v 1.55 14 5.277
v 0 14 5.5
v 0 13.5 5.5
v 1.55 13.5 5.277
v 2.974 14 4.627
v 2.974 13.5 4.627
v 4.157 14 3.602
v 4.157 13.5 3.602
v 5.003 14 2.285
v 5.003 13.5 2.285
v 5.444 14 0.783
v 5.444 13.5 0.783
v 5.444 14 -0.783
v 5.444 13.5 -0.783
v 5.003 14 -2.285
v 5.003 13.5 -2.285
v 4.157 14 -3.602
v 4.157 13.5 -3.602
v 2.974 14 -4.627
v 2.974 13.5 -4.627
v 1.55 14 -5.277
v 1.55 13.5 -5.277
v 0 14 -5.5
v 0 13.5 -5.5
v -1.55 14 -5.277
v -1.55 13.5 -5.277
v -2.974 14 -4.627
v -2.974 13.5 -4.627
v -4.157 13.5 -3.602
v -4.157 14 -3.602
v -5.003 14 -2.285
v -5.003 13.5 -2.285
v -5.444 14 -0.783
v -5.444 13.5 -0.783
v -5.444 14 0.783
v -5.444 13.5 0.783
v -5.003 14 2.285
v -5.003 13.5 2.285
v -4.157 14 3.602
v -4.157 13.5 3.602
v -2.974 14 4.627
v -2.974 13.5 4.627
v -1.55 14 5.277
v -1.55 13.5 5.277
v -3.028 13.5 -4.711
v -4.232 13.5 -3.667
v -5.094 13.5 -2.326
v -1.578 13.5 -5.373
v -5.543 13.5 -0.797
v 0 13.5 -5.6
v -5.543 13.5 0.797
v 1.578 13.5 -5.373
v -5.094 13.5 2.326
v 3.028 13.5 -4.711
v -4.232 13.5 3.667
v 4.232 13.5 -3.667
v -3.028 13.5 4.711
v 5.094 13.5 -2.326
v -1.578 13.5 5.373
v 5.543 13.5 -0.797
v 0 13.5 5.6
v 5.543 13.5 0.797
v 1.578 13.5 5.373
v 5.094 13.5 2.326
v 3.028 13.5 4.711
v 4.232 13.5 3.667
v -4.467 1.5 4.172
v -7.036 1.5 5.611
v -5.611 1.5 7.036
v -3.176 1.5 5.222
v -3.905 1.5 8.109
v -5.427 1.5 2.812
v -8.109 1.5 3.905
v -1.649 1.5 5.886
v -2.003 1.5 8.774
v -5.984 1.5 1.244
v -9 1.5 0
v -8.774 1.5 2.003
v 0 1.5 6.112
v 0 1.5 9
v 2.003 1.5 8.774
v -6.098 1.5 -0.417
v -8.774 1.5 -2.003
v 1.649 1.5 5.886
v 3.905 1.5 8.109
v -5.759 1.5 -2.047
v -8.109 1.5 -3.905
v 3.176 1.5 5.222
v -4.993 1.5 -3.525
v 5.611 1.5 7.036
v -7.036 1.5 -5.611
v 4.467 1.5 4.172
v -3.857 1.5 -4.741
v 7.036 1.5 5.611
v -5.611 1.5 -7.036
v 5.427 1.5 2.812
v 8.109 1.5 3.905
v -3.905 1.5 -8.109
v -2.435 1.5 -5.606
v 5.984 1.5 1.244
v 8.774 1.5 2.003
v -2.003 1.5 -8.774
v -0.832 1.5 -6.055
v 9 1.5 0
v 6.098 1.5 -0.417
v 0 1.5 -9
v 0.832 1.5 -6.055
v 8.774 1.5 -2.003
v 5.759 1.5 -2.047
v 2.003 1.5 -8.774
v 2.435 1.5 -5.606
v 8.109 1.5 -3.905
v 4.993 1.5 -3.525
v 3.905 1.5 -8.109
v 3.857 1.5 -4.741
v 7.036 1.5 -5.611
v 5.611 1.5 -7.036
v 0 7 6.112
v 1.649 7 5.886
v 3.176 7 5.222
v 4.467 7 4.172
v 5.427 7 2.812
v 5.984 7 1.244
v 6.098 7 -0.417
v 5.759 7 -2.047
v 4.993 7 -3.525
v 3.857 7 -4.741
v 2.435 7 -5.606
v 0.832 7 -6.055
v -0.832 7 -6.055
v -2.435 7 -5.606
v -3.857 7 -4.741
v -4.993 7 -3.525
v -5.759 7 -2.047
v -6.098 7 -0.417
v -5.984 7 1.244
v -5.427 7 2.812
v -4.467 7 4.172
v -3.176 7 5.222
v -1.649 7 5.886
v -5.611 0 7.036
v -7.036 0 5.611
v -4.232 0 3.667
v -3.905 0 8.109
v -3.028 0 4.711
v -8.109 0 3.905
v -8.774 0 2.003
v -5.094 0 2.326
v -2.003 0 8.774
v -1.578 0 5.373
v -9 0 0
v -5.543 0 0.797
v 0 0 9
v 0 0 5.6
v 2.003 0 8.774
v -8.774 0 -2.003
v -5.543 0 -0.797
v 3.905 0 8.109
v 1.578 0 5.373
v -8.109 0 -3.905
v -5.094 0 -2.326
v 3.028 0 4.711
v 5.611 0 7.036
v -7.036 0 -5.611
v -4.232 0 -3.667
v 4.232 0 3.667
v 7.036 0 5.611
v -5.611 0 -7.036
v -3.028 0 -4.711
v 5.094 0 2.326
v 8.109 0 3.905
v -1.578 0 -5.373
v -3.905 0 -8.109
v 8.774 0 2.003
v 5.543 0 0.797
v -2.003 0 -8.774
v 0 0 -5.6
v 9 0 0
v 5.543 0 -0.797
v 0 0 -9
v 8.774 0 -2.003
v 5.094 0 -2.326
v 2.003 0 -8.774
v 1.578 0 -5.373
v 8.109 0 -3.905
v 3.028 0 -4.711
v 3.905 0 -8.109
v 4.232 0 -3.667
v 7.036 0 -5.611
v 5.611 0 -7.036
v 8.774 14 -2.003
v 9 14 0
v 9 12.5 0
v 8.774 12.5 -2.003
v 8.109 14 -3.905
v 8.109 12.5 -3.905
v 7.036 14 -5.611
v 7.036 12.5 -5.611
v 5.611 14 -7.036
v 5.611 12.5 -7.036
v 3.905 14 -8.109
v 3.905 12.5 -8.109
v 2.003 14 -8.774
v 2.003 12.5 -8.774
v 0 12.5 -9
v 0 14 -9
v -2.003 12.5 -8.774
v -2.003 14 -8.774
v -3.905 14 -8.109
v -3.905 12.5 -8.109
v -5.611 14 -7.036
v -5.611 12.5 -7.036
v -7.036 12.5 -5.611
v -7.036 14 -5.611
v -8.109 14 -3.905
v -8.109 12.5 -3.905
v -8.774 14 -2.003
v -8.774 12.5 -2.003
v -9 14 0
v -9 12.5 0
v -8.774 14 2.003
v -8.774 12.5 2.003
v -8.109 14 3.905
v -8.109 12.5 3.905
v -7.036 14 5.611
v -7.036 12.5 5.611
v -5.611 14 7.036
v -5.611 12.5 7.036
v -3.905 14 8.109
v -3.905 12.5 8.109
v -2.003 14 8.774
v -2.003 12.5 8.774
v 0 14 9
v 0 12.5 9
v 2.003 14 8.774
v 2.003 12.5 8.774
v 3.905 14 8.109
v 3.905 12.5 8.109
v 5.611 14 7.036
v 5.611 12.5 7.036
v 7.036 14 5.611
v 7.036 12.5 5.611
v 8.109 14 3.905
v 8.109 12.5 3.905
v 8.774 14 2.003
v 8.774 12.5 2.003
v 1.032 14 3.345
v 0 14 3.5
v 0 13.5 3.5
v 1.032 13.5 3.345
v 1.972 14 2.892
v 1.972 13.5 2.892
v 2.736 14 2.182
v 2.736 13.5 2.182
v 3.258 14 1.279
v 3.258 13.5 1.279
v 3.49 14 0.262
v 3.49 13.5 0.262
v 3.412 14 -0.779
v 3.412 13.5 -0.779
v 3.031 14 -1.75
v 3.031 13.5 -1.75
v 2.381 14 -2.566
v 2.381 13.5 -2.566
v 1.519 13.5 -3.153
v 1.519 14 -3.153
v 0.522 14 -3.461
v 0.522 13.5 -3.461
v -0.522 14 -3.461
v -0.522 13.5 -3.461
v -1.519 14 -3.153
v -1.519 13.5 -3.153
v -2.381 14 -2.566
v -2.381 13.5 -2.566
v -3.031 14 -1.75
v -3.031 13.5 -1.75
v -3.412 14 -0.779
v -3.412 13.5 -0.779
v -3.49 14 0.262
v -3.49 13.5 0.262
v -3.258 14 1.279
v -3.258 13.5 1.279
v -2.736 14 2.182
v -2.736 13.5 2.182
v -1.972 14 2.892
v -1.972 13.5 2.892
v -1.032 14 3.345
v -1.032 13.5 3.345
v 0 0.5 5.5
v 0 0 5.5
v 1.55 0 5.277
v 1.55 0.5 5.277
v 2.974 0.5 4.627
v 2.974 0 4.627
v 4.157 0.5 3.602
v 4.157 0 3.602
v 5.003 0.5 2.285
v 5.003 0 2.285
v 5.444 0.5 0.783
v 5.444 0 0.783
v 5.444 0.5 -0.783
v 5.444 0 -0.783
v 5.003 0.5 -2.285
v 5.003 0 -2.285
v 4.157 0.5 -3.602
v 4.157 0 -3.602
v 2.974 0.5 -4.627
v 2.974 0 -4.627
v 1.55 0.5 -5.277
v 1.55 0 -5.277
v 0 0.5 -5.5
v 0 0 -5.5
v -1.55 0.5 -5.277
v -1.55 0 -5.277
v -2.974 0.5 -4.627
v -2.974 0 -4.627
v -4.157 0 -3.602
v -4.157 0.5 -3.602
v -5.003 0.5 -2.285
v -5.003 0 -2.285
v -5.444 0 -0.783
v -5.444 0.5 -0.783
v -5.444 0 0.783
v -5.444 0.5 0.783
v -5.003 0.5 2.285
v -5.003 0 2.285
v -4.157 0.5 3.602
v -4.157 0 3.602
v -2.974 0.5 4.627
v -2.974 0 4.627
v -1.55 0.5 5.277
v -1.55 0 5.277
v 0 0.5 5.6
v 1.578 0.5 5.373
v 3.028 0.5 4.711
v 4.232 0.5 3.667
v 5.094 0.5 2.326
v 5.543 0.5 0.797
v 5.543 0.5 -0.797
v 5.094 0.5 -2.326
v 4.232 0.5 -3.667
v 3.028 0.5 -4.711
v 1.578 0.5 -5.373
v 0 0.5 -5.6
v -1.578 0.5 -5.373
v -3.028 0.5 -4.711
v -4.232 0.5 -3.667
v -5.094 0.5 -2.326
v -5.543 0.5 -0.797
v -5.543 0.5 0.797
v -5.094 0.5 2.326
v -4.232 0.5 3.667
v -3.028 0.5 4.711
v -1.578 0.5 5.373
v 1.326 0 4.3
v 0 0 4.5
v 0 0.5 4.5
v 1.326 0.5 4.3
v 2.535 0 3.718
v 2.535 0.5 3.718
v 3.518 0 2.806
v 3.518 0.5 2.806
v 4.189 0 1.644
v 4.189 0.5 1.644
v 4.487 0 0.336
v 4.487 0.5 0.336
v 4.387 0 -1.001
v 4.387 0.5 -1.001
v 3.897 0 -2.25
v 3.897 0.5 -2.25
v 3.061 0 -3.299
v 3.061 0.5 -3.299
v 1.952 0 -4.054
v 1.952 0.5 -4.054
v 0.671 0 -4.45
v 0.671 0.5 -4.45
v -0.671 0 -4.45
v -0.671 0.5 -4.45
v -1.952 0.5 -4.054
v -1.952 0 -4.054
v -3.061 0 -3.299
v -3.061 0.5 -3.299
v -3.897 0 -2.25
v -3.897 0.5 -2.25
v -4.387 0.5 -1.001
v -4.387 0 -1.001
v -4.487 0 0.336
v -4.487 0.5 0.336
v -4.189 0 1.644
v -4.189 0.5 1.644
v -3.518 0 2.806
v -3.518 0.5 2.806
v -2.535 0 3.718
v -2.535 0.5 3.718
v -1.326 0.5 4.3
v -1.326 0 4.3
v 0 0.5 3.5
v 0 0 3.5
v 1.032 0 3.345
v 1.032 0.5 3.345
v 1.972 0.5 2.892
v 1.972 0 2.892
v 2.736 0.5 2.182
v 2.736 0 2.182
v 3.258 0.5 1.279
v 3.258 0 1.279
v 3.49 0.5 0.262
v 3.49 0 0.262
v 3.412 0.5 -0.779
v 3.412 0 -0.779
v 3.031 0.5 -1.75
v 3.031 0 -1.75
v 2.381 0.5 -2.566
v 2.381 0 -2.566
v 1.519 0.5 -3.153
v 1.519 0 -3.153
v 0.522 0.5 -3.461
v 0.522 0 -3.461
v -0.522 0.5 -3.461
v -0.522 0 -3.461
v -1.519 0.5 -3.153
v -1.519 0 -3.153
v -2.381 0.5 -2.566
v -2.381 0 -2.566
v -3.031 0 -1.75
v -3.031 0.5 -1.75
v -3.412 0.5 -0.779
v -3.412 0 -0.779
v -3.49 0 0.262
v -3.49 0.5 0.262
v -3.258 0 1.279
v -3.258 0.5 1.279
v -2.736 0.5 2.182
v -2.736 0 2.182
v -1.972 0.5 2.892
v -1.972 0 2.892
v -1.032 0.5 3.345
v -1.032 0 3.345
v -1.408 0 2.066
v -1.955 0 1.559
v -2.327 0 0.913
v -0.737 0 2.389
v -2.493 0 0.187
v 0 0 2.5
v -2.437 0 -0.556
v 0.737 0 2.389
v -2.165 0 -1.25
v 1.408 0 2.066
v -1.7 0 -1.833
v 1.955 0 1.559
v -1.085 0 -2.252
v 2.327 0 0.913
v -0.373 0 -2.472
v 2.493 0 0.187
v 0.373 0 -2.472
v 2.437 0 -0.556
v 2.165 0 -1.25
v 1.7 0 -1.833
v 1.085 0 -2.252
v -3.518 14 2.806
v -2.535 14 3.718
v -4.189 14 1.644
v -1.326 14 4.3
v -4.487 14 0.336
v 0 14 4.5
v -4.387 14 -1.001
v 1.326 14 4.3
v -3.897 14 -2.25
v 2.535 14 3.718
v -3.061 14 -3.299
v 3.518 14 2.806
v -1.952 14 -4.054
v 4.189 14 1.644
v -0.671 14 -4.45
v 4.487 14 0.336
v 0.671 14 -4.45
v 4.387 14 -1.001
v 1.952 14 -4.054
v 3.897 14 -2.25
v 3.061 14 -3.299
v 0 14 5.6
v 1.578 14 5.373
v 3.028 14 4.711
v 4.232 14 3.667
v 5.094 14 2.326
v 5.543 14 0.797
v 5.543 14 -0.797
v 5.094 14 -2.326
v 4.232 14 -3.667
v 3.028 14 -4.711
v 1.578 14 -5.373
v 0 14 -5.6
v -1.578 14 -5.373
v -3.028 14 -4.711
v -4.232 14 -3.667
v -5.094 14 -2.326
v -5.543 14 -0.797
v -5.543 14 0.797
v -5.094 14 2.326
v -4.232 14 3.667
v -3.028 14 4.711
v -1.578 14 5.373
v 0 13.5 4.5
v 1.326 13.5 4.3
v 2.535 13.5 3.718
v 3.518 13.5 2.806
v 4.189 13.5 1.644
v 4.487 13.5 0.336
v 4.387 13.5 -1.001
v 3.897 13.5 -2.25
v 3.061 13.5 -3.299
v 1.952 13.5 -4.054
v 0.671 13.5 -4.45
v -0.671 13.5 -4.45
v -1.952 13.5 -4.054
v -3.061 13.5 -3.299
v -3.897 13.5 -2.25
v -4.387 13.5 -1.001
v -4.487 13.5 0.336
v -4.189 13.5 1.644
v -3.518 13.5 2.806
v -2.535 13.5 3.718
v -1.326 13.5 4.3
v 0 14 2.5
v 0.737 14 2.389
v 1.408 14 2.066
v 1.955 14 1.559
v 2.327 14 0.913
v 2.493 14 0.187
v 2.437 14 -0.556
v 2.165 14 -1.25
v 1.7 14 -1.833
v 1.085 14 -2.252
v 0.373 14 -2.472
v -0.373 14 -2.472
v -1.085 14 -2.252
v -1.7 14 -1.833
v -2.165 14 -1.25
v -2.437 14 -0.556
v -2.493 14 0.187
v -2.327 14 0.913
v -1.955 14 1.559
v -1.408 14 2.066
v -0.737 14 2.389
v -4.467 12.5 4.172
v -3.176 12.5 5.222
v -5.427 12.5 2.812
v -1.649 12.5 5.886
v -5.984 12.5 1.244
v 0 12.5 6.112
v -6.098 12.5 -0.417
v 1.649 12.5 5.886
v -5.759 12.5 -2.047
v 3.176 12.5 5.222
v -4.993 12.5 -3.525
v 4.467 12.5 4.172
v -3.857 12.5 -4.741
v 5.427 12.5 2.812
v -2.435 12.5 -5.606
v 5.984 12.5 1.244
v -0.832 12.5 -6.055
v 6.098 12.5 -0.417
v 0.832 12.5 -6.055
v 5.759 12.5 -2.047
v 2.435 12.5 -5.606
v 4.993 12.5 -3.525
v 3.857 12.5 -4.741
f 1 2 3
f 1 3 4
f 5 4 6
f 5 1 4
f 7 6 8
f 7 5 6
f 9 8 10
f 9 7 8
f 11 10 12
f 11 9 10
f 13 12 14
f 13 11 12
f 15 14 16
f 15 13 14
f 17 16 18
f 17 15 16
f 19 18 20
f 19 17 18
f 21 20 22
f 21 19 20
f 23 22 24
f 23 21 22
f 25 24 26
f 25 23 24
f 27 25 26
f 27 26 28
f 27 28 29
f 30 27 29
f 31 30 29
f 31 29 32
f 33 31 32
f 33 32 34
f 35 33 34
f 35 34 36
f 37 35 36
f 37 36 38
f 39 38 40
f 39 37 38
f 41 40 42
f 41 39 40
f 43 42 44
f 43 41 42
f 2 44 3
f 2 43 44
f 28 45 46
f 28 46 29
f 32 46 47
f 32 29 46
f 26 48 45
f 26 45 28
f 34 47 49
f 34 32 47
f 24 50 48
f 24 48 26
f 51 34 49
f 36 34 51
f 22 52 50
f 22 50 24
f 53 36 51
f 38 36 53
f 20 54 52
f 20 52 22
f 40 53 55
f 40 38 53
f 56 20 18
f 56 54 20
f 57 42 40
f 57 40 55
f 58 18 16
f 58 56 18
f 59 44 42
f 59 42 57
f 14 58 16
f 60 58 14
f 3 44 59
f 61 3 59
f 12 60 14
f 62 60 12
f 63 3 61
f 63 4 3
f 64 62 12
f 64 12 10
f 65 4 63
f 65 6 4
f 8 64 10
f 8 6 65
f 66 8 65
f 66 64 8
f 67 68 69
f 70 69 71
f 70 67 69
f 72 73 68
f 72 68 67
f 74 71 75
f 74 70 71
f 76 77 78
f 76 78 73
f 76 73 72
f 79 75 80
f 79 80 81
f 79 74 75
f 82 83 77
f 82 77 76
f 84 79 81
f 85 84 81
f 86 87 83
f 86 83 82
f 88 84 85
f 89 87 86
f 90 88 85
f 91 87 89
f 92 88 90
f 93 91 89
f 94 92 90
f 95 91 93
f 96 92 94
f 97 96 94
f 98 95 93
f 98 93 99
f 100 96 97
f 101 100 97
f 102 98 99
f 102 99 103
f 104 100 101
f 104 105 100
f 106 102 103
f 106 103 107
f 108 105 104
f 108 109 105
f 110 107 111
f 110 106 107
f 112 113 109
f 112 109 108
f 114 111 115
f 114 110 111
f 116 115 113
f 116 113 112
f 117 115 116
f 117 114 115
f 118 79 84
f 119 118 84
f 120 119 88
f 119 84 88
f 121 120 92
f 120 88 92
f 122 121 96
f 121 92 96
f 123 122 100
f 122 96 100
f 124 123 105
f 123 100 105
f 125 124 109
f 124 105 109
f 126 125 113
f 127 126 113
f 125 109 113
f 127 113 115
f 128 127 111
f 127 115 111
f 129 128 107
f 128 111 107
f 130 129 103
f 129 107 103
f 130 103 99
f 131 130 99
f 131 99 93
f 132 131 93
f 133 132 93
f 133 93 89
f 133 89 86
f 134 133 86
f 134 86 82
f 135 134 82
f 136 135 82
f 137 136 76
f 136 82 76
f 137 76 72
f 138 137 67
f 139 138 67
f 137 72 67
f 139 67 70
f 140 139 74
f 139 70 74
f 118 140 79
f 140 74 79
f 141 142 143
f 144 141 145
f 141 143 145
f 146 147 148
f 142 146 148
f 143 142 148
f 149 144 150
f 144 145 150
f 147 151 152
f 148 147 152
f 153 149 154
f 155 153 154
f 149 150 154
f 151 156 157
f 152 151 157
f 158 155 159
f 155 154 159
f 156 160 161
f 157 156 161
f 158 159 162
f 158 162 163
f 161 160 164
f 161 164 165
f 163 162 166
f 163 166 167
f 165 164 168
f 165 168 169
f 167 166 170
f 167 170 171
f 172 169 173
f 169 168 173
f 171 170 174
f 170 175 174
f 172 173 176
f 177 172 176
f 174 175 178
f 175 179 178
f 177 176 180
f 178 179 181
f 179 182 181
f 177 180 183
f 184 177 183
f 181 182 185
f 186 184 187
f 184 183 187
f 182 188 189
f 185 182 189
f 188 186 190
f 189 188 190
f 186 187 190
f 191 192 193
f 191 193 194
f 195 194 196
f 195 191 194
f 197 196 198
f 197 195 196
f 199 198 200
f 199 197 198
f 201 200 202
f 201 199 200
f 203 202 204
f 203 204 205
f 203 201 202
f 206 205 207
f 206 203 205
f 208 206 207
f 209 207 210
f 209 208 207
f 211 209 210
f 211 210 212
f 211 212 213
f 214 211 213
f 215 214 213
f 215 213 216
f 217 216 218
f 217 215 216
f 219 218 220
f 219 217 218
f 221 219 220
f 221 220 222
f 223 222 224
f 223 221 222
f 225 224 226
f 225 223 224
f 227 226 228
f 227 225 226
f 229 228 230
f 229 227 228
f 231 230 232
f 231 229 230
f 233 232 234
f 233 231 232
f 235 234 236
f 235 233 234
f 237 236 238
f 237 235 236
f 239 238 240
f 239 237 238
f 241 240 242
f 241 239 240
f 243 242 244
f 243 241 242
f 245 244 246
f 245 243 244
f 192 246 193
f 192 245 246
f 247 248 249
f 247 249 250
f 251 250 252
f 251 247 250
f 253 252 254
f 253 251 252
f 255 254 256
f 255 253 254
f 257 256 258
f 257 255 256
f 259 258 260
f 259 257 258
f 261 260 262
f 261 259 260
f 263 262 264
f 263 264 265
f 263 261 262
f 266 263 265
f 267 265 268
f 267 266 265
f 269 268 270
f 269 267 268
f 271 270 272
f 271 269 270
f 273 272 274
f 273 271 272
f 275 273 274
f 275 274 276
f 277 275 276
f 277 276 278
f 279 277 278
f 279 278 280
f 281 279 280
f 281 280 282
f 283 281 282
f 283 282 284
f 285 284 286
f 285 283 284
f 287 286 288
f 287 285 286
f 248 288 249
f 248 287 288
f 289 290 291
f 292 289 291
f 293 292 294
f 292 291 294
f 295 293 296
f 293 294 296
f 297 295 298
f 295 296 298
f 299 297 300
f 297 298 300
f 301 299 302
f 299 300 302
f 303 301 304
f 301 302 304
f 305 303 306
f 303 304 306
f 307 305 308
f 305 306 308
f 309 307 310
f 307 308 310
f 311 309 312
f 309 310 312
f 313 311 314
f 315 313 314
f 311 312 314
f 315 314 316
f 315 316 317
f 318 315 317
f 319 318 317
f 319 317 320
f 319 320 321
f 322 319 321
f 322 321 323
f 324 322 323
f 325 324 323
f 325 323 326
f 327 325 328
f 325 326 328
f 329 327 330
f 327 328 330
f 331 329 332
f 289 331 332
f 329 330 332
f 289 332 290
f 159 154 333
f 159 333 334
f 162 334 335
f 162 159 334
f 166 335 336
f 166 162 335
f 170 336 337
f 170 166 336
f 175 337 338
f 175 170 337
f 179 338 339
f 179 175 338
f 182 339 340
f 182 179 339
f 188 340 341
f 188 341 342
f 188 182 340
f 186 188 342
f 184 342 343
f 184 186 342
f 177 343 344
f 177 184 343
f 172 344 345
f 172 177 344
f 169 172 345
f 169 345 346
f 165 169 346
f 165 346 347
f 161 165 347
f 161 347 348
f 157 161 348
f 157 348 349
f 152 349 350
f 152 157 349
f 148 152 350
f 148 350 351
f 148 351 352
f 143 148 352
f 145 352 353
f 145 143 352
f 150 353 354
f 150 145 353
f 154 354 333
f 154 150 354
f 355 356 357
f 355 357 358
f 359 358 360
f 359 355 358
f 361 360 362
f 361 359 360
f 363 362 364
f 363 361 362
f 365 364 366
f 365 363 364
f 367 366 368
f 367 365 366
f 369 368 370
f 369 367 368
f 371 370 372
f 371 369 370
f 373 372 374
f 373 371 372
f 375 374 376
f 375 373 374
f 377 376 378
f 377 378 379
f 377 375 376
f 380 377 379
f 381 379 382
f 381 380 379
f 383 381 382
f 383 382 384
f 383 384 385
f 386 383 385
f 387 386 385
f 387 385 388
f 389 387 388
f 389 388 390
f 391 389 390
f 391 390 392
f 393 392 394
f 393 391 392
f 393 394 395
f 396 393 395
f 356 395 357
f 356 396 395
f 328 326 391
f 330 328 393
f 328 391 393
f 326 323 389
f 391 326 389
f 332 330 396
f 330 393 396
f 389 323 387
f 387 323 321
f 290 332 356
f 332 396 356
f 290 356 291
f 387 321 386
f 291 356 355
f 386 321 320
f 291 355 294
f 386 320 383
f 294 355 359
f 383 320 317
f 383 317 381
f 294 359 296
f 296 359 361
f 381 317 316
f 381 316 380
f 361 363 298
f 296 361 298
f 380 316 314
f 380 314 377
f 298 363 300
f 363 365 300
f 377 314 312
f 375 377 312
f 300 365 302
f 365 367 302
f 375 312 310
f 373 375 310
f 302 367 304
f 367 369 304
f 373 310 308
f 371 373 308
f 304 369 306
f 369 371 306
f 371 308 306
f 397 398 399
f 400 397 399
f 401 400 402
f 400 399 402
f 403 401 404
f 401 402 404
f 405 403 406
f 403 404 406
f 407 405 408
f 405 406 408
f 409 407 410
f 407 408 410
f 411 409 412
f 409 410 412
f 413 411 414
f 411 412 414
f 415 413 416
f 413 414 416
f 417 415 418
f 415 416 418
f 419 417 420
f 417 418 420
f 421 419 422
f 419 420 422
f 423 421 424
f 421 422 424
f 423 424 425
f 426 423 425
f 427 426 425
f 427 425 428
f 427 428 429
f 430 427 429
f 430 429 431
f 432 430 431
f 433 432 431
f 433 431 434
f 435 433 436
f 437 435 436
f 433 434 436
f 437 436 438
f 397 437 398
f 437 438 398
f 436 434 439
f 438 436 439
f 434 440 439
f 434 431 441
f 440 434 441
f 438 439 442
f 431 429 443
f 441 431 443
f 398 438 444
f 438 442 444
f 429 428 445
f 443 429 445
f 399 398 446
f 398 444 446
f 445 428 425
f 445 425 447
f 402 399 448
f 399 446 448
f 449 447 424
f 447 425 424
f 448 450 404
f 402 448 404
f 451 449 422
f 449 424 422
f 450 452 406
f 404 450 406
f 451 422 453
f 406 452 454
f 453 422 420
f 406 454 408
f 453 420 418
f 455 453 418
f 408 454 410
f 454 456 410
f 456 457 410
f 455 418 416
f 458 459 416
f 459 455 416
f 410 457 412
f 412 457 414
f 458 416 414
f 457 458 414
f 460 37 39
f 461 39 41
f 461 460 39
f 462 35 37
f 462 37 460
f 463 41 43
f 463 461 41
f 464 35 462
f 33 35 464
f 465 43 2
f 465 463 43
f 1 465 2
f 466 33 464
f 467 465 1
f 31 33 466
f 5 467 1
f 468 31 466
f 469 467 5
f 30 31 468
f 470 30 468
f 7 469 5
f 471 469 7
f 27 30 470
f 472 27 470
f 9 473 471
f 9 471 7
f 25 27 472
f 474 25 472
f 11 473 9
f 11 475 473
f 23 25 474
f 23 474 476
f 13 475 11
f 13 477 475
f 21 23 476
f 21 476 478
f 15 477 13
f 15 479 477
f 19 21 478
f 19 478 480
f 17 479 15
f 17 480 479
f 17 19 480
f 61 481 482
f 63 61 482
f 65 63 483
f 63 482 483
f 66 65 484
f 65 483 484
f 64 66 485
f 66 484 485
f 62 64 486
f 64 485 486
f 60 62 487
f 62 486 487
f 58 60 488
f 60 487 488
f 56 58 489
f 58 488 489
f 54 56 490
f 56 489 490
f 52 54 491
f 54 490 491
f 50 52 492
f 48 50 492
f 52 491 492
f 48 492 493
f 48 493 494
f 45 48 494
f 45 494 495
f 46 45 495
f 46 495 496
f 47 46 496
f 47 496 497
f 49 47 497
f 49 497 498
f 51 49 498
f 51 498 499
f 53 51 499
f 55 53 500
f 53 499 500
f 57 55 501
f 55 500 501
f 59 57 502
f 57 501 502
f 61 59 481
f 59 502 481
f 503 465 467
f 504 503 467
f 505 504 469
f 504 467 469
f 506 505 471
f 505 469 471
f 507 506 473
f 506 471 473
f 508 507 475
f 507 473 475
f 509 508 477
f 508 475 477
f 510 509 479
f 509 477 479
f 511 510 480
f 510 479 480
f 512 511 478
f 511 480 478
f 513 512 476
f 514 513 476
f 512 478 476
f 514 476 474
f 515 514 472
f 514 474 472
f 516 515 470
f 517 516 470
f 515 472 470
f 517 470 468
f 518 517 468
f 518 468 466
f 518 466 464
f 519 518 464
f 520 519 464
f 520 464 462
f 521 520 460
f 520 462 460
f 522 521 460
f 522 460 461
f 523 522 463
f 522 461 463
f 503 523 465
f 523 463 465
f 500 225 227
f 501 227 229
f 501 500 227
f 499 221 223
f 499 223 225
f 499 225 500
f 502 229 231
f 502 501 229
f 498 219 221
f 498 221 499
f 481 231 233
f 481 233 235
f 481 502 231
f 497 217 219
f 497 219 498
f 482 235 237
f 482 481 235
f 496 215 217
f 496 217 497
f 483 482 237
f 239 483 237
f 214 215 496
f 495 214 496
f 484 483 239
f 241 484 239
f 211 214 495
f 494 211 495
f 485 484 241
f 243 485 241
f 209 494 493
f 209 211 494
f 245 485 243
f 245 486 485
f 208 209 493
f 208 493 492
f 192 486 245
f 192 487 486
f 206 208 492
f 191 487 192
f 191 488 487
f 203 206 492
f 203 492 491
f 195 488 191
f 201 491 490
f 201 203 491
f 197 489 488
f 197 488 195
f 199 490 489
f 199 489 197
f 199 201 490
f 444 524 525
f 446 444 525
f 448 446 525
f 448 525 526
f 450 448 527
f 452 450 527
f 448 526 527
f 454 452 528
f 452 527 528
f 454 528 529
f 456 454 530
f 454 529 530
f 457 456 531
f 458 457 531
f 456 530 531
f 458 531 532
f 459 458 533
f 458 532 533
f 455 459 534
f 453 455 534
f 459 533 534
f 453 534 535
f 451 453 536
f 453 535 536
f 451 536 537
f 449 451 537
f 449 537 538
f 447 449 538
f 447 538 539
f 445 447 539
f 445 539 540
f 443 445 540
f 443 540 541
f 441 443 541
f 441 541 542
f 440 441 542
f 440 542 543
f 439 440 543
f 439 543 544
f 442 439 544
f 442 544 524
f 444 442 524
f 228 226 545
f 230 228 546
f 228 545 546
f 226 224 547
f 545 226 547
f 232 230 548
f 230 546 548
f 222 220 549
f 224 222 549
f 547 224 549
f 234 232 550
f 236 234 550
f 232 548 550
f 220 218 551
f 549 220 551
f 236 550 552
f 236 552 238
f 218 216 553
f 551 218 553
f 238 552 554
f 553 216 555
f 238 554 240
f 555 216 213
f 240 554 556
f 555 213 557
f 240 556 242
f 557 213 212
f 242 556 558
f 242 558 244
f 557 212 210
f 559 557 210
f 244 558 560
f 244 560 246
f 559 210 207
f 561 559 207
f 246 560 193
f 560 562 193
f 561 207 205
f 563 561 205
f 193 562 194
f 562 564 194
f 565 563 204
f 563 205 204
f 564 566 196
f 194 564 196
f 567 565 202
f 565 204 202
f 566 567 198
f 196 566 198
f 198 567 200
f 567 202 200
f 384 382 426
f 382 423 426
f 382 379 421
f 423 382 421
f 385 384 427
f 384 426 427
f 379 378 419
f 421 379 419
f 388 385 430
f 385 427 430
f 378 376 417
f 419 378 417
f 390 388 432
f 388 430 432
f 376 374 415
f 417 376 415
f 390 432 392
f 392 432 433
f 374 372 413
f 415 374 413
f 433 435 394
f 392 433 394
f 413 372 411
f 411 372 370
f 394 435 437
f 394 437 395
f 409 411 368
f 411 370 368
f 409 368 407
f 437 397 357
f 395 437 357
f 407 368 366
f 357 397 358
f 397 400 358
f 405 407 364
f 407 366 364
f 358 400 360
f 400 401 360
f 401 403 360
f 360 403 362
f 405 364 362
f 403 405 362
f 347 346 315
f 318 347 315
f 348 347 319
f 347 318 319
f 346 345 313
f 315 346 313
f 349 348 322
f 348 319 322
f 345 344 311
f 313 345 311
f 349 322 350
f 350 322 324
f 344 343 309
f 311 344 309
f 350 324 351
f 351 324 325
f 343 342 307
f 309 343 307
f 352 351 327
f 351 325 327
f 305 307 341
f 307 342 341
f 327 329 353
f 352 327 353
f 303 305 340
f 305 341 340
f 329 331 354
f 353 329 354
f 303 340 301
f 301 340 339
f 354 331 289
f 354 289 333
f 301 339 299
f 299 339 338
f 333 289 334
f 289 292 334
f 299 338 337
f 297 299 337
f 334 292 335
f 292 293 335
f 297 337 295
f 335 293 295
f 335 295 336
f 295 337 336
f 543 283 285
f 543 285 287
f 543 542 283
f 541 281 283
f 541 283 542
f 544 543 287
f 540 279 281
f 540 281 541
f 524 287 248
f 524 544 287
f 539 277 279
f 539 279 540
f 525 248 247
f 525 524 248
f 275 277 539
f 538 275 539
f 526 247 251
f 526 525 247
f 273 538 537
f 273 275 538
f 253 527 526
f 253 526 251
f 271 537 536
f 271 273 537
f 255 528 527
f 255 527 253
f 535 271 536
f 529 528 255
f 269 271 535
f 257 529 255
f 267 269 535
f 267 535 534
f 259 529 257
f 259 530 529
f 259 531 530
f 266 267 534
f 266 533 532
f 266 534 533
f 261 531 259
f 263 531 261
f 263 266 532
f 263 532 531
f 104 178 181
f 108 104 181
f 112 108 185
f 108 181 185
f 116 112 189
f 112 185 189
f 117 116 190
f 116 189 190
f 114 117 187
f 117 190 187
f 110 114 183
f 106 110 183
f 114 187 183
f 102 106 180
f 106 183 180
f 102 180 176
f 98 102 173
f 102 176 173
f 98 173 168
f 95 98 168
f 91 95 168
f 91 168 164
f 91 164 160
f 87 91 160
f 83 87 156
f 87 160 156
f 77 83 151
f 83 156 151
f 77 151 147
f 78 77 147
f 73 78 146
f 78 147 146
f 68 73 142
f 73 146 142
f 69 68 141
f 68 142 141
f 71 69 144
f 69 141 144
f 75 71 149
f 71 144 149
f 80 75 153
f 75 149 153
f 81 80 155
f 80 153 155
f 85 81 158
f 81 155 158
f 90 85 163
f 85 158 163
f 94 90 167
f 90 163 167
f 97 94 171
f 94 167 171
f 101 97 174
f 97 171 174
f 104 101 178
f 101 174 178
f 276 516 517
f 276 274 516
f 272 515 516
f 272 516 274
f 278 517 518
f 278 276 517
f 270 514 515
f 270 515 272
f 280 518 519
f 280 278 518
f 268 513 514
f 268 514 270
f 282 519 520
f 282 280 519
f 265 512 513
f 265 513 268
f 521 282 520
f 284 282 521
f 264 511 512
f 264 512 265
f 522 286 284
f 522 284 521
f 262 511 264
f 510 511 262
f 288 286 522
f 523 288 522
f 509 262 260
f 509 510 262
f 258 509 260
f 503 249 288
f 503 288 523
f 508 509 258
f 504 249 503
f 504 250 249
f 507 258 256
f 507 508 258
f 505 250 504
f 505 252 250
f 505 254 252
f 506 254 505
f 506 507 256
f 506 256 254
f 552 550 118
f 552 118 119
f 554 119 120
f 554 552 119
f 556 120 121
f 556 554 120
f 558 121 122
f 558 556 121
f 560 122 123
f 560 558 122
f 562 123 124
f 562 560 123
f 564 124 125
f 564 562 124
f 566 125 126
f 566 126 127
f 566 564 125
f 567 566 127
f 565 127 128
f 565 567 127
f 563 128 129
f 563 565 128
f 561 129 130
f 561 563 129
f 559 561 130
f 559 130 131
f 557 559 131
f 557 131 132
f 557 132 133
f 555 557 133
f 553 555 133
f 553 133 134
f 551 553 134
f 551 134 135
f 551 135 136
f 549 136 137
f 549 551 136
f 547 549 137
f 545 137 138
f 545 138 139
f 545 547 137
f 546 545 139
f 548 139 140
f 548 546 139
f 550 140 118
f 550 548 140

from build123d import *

# Parameters (mm, degrees)
BOSS_EXTRUDE1_OUTLINE_R = 9
BOSS_EXTRUDE1_DEPTH     = 1.5
SKETCH2_R               = 6.1121977
BOSS_EXTRUDE2_DEPTH     = 5.5
SKETCH3_R               = 2.5
CUT_EXTRUDE1_DEPTH      = 19.920887928
SKETCH4_R               = 5.6
SKETCH4_R_2             = 5.5
SKETCH4_R_3             = 4.5
SKETCH4_R_4             = 3.5
CUT_EXTRUDE2_DEPTH      = 0.5


# Read off the part's stored shape, not the designer's step: Boss-Extrude1
with BuildPart() as part:
    # Boss-Extrude1 outline → Boss-Extrude1 (new body)
    with BuildSketch(Plane(origin=(0, 0, 0), x_dir=(1, 0, 0), z_dir=(0, 1, 0))):
        Circle(BOSS_EXTRUDE1_OUTLINE_R)
    boss_extrude1 = extrude(amount=BOSS_EXTRUDE1_DEPTH)

    # Sketch2 → Boss-Extrude2 (add)
    with BuildSketch(Plane(origin=(0, 1.5, 0), x_dir=(1, 0, 0), z_dir=(0, 1, 0))):
        with Locations(Location((0, 0, 0), (0, 0, 270))):
            Circle(SKETCH2_R)
    boss_extrude2 = extrude(amount=BOSS_EXTRUDE2_DEPTH)

    # Mirror1: Boss-Extrude2 across plane
    add(boss_extrude2.mirror(Plane.ZX.offset(7)))

    # Mirror2: Boss-Extrude1 across plane
    add(boss_extrude1.mirror(Plane.ZX.offset(7)))

    # Sketch3 → Cut-Extrude1 (cut, through all)
    with BuildSketch(Plane(origin=(0, 14, 0), x_dir=(1, 0, 0), z_dir=(0, 1, 0))):
        with Locations(Location((0, 0, 0), (0, 0, 270))):
            Circle(SKETCH3_R)
    extrude(amount=-CUT_EXTRUDE1_DEPTH, mode=Mode.SUBTRACT)

    # Sketch4 → Cut-Extrude2 (cut)
    # profile 1 of 2: a face of its own
    with BuildSketch(Plane(origin=(0, 14, 0), x_dir=(1, 0, 0), z_dir=(0, 1, 0))):
        with Locations(Location((0, 0, 0), (0, 0, 270))):
            Circle(SKETCH4_R)
        with Locations(Location((0, 0, 0), (0, 0, 270))):
            Circle(SKETCH4_R_2, mode=Mode.SUBTRACT)
    # profile 2 of 2: a face of its own
    with BuildSketch(Plane(origin=(0, 14, 0), x_dir=(1, 0, 0), z_dir=(0, 1, 0))):
        with Locations(Location((0, 0, 0), (0, 0, 270))):
            Circle(SKETCH4_R_3)
        with Locations(Location((0, 0, 0), (0, 0, 270))):
            Circle(SKETCH4_R_4, mode=Mode.SUBTRACT)
    cut_extrude2 = extrude(amount=-CUT_EXTRUDE2_DEPTH, mode=Mode.SUBTRACT)

    # Mirror3: Cut-Extrude2 across plane
    add(cut_extrude2.mirror(Plane.ZX.offset(7)), mode=Mode.SUBTRACT)


solid = part.part
